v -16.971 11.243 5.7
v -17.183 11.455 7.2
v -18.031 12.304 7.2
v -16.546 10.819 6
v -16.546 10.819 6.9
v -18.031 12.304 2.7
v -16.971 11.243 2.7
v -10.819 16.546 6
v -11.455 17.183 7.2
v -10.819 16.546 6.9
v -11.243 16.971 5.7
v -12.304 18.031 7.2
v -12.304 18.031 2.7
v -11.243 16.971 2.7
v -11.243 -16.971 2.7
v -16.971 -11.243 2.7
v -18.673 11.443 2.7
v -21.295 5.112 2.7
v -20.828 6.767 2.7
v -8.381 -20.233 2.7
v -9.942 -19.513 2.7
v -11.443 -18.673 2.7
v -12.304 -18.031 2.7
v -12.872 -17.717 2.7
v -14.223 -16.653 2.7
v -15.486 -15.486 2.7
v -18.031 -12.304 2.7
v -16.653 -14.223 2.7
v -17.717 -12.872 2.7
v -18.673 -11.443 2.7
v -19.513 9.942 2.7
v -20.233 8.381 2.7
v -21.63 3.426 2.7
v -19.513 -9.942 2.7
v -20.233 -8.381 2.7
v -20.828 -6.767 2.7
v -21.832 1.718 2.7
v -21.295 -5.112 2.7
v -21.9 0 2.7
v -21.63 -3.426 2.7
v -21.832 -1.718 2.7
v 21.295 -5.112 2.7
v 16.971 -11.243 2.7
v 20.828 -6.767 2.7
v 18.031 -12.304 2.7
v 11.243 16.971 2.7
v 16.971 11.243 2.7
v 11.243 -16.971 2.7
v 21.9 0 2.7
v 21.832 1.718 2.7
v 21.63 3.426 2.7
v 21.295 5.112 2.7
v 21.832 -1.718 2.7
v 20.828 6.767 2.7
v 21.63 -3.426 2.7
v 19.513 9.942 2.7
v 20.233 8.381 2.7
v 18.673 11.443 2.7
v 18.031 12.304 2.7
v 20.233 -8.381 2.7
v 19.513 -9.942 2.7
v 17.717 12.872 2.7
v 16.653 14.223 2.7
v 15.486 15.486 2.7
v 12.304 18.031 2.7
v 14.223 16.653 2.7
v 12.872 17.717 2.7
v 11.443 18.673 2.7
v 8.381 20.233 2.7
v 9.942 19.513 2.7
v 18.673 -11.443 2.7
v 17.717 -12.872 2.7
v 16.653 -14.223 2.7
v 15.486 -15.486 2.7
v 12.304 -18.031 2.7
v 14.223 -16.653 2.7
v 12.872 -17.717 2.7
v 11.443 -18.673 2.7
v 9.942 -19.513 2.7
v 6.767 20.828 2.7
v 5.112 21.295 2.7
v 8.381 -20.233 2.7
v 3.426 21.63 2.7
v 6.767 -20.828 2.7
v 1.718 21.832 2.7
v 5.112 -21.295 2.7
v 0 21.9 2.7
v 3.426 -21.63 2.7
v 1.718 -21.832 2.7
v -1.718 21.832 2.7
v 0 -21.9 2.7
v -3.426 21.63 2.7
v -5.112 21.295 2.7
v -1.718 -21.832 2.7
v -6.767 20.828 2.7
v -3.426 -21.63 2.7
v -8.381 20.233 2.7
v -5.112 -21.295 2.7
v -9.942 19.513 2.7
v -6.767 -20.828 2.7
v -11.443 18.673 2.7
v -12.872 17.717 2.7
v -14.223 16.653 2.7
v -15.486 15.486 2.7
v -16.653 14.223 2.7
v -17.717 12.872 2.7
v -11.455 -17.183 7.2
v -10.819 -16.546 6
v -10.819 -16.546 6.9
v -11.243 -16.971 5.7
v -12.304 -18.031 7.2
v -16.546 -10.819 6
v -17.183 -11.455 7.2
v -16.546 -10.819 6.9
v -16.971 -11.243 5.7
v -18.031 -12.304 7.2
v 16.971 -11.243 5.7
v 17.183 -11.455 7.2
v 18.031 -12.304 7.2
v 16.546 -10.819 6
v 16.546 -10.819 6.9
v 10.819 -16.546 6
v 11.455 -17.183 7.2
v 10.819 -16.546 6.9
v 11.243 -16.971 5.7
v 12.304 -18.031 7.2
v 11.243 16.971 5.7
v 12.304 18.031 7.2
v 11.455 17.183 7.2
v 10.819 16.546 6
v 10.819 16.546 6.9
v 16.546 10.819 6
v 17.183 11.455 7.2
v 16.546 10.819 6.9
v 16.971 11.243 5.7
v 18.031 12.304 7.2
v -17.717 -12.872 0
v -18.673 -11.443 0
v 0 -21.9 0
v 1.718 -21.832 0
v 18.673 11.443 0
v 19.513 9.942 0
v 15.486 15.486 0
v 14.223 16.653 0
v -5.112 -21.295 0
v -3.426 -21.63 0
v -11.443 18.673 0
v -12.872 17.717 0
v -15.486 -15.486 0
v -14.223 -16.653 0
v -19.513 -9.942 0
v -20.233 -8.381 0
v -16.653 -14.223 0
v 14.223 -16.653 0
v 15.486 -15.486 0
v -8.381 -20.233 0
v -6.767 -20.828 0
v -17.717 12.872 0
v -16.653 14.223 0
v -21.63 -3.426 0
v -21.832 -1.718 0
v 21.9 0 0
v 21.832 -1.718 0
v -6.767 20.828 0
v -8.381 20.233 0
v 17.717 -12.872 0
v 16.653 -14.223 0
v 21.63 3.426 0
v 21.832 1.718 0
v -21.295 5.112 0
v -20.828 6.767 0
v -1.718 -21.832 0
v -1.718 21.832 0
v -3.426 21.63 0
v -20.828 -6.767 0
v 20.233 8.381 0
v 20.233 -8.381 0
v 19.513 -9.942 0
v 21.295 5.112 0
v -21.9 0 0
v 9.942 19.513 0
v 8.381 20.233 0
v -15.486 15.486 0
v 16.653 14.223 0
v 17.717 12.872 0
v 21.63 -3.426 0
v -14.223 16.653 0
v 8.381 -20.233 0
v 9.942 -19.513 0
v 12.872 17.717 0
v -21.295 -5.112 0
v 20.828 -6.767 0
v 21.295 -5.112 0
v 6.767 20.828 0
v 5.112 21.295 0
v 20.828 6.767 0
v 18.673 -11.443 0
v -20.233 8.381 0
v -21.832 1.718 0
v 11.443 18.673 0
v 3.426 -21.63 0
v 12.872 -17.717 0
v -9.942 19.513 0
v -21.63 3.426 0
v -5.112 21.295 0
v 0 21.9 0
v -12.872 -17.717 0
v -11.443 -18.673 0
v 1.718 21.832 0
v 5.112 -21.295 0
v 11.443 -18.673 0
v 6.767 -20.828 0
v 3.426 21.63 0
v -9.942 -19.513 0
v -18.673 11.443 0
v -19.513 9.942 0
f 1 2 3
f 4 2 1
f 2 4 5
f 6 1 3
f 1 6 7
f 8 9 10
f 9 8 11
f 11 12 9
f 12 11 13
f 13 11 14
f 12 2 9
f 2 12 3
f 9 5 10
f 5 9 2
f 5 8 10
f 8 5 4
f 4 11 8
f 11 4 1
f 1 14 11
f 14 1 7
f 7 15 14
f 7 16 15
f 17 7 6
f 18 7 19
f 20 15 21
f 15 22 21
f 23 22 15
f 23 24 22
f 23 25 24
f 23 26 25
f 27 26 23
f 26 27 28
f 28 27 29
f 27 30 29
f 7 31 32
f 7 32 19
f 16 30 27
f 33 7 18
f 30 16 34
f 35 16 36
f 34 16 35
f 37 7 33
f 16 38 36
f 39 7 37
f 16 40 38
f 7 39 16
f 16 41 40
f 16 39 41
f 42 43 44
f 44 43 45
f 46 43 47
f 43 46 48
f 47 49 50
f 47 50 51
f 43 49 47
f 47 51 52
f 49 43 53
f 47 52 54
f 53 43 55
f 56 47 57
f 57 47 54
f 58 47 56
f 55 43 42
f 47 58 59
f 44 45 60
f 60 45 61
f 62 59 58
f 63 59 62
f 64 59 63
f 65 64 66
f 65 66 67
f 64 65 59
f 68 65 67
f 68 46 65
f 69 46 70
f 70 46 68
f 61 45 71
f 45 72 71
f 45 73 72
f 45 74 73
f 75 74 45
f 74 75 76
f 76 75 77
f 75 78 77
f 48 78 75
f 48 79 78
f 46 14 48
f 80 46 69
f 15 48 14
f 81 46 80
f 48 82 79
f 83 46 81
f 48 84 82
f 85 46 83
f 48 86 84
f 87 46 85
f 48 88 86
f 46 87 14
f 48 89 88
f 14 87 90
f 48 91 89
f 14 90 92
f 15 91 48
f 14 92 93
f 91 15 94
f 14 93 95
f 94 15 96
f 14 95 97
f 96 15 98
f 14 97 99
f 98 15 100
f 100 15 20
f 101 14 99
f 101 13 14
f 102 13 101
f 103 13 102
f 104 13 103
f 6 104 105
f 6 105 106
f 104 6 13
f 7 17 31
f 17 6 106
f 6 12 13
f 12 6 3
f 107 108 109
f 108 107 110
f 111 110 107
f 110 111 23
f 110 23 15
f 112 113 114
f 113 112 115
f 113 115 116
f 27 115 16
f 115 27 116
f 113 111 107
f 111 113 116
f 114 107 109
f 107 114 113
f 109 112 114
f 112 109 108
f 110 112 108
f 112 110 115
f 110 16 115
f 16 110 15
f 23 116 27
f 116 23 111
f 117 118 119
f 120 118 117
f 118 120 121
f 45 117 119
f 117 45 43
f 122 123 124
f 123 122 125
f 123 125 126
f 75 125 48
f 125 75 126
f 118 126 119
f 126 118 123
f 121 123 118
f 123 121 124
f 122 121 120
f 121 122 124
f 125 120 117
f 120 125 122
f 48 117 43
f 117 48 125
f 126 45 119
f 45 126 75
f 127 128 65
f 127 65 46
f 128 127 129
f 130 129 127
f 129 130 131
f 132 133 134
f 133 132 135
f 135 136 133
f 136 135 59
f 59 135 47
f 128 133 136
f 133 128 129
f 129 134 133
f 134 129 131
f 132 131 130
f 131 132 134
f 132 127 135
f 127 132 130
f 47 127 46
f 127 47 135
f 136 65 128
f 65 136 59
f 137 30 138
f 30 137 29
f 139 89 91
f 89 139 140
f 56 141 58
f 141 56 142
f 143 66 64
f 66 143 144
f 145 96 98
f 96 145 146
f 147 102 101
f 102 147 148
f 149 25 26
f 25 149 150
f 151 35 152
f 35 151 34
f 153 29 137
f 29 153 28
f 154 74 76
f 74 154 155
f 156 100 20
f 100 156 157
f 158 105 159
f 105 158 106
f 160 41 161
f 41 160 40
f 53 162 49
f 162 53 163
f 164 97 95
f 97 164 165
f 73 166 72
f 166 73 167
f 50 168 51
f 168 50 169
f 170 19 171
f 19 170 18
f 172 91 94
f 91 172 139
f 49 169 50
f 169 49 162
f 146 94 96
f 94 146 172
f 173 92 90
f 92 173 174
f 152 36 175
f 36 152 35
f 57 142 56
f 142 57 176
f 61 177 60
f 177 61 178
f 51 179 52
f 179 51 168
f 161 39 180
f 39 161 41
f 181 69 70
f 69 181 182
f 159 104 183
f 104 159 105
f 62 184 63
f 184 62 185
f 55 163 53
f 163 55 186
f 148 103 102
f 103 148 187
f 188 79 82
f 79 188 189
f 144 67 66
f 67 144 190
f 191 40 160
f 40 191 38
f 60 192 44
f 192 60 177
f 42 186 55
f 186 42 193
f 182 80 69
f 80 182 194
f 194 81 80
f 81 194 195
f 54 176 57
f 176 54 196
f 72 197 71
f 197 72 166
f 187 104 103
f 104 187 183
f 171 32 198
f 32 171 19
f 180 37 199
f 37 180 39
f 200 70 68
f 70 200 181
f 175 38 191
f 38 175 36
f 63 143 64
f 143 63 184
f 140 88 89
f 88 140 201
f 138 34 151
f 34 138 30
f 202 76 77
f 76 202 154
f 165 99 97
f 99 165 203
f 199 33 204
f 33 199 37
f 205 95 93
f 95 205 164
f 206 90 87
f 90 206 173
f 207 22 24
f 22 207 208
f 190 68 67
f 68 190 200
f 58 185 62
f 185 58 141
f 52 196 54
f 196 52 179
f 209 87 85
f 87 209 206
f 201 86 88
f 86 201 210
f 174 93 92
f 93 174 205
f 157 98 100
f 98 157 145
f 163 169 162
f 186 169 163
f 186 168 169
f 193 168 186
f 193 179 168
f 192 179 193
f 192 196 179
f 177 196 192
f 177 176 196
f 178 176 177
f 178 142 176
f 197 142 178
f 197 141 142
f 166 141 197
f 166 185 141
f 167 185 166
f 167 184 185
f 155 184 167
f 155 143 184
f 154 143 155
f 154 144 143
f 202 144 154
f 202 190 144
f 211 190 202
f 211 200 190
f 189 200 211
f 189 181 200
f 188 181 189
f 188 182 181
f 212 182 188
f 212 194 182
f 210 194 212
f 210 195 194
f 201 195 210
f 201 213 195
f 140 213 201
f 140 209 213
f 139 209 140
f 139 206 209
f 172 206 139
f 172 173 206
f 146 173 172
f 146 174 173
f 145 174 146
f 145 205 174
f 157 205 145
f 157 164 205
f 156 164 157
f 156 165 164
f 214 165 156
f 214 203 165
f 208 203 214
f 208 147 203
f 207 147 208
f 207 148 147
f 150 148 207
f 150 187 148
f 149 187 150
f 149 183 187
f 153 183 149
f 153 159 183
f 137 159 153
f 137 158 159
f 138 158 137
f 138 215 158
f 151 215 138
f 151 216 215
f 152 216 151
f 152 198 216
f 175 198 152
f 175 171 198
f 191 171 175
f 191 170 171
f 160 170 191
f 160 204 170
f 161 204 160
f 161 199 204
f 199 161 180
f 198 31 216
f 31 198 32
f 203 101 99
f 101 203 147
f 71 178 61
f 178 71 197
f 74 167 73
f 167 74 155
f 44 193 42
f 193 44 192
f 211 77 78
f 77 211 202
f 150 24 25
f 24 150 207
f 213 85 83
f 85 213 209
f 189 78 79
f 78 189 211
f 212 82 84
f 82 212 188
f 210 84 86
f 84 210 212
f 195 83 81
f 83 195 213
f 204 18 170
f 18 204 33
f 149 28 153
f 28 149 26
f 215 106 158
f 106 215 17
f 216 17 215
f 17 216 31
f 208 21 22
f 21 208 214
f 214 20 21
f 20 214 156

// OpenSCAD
center_style="hole"; // [kanji,hole,blank]
points=4;
color="blue";
nub_roundness=.9;
nub_round_y=2.1;
nub_chamfer=false;
nub_type=1;
multi_star(points);
translate([0,0,4]) mirror([0,0,1]) !badge();
module badge() {
  scale(1.5) {
  cylinder(d=29.2,h=1.8,$fn=80);
  for(r=[45:90:360]) rotate([0,0,r])
    translate([-2.7,13.2,1.8]) rotate([90,0]) rotate([0,90]) linear_extrude(5.4,convexity=3) {
      //square([1.6,4]);
      translate([.1,0]) polygon([[0,2],[-.4,2.2],[-.4,2.8],[.2,3],[1,3],[1,2.6],[1,0],[0,0]]);
  }
}
}
module multi_star(points=6)
{
  scale(1.5)
  color(color) intersection() {
  translate([0,0,2]) scale([1,1,.6]) sphere(d=50,$fn=100);
  union() {
    if(center_style!="hole") cylinder(d=32,h=1,$fn=80);
    else intersection(){
      cylinder(d=32,h=2,$fn=80);
        for(r=[45:90:360]) rotate([0,0,r]) translate([-4,12]) difference(){
        cube([8,6,2]);
          translate([1.2,1.2,-.01]) cube([5.6,5.6,2.02]);
      }
    }
    if(center_style=="kanji") linear_extrude(2,convexity=3) {
      scale(0.75) kanji(color);
      rotate([0,0,90-(180/points)]) difference() {
        circle(d=33,$fn=points);
        circle(d=30,$fn=points);
      }
    }
    translate([0,0,3]) intersection() {
      for(r=[0:points-1]) rotate([0,0,r*(360/points)])
      {
        linear_extrude(0.6) translate([18,10]) rotate([0,0,-120]) squiggle();
        *for(m=[0:1]) mirror([m,0])
        translate([-8,14]) rotate([0,0,30]) cube([20,1,0.6]); // slash accents
      }
      linear_extrude(2.2,convexity=3) offset(r=-1.4) multi_profile(points, 1);
    }
    difference() {
      linear_extrude(4,convexity=3) multi_profile(points);
      translate([0,0,3]) linear_extrude(2.2,convexity=3) offset(r=-1.4) multi_profile(points, 1);
    }
  }
}
}
module multi_profile(points=5,extra=0) {
  difference() {
  circle(d=33,$fn=100);
  //if(center_style=="hole")
    circle(d=30,$fn=60);
  }
  difference() {
    for(r=[0:points-1]) rotate([0,0,r*(360/points)])
      nub();
    circle(d=30,$fn=60);
  }
}
module nub(type=nub_type)
{
  if(type==1)
  {
    intersection() {
        
        scale([2+points*-.15,1]) polygon([[-8,10],[-2,26],[2,26],[8,10]]);
        scale([nub_roundness,nub_round_y]) circle(d=26,$fn=40);
        circle(d=50,$fn=100);
      }
  }
  if(type==2)
    polygon([[-6,10],[-10,20],[0,25],[10,20],[6,10]]);
  if(type==3)
    intersection() {
        
        scale([nub_roundness,nub_round_y]) circle(d=26,$fn=40);
        circle(d=50,$fn=100);
      }
}
module gold_star()
{
  intersection() {
  translate([0,0,2]) scale([1,1,.6]) sphere(d=50,$fn=100);
  union() {
    difference() {
      linear_extrude(4,convexity=3) gold_profile();
      translate([0,0,3]) linear_extrude(2.2,convexity=3) offset(-1.4) gold_profile(1);
    }
  }
}
}
module gold_profile(extra=0) {
  difference() {
  circle(d=33,$fn=100);
  circle(d=30,$fn=60);
  }
  difference() {
    for(r=[0:5]) rotate([0,0,r*(360/6)])
      translate([0,15]) {
        difference() {
          intersection() {
            translate([-8,-1]) square([16,12]);
            translate([10,-10]) circle(d=40,$fn=80);
          }
          translate([12,3]) circle(d=12,$fn=40);
        }
        if(extra)
        {
          polygon([[0,0],[2,-4],[10,-30],[10,0]]);
        }
      }
    circle(d=30,$fn=60);
  }
}
module red_star() {
scale(1.5) intersection() {
  #translate([0,0,2]) scale([1,1,.6]) sphere(d=50,$fn=100);
  union() {
    difference() {
      linear_extrude(4,convexity=3) red_profile();
      translate([0,0,3]) linear_extrude(2.2,convexity=3) offset(-1.4) red_profile(1);
    }
    translate([0,0,3]) linear_extrude(1) for(r=[0:3]) rotate([0,0,r*90]) translate([19,-5]) rotate([0,0,205]) squiggle();
  }
}
}
module red_profile(extra=0) {
  difference() {
  circle(d=50,$fn=100);
  circle(d=30,$fn=50);
  difference() {
    for(r=[0:3]) rotate([0,0,r*90])
      translate([17,0]) {
        polygon([[0,0],[6,0],[10,-5],[20,10],[8,8],[6,5],[-4,10]]);
        if(extra)
        {
          polygon([[0,0],[2,-4],[10,-30],[10,0]]);
        }
      }
    circle(d=34,$fn=50);
  }
}
}

module squiggle() {
line();
translate([6,0]) rotate([0,0,90]) line();
translate([6,0]) rotate([0,0,90]) translate([6,0]) rotate([0,0,-90]) line();
translate([6,0]) rotate([0,0,90]) translate([6,0]) rotate([0,0,-90]) translate([6,0]) rotate([0,0,90]) line();
translate([6,0]) rotate([0,0,90]) translate([6,0]) rotate([0,0,-90]) translate([6,0]) rotate([0,0,90]) translate([6,0]) rotate([0,0,-90]) line();
}
module line(x=6,y=0,t=1) {
  hull() {
    circle(d=t,$fn=8);
    translate([x,y]) circle(d=t,$fn=8);
  }
}

module kanji(char="red") {
  if(char=="red") kanji_red();
  else if(char=="blue") kanji_blue();
  else if(char=="gold") kanji_gold();
  else if(char=="super") kanji_super();
  else if(char=="pink") kanji_pink();
  else if(char=="white") kanji_white();
  else if(char=="yellow") kanji_yellow();
}
module kanji_blue() {
  scale(2) translate([26.93,0]) scale([25.4/90, -25.4/90])
  union()
  {
      polygon([[-80.118500,-5.165000],[-79.452500,-4.818500],[-79.218500,-4.013000],[-79.452500,-3.207500],[-80.118500,-2.861000],[-110.751500,-2.861000],[-111.404000,-3.207500],[-111.651500,-4.013000],[-111.404000,-4.818500],[-110.751500,-5.165000],[-96.929500,-5.165000],[-96.929500,-7.325000],[-107.511500,-7.325000],[-108.177500,-7.653500],[-108.411500,-8.441000],[-108.177500,-9.228500],[-107.511500,-9.557000],[-96.928500,-9.557000],[-96.928500,-11.536000],[-109.275500,-11.536000],[-109.941500,-11.887000],[-110.175500,-12.724000],[-109.941500,-13.525000],[-109.275500,-13.840000],[-96.928500,-13.840000],[-96.928500,-15.784000],[-96.591000,-16.576000],[-95.632500,-16.828000],[-94.674000,-16.576000],[-94.336500,-15.784000],[-94.336500,-13.840000],[-81.666500,-13.840000],[-81.000500,-13.529500],[-80.766500,-12.760000],[-81.000500,-11.891500],[-81.666500,-11.536000],[-94.336500,-11.536000],[-94.336500,-9.557000],[-83.357500,-9.557000],[-82.691500,-9.228500],[-82.457500,-8.441000],[-82.691500,-7.653500],[-83.357500,-7.325000],[-94.337500,-7.325000],[-94.337500,-5.165000],[-80.118500,-5.165000]]);
    difference()
    {
         polygon([[-104.164500,15.641000],[-104.501875,16.419000],[-105.459500,16.684000],[-106.503500,16.414000],[-106.899500,15.604000],[-106.899500,1.890000],[-106.721750,0.725625],[-106.179500,-0.081000],[-105.259250,-0.550125],[-103.947500,-0.702000],[-86.993500,-0.702000],[-85.666562,-0.550125],[-84.748000,-0.081000],[-84.214188,0.725625],[-84.041500,1.890000],[-84.041500,13.193000],[-84.273797,14.599094],[-85.008875,15.586500],[-86.304016,16.168906],[-88.216500,16.360000],[-92.464500,15.928000],[-93.067500,15.550000],[-93.292500,14.848000],[-93.256500,14.524000],[-92.842500,13.790500],[-92.104500,13.516000],[-91.852500,13.552000],[-88.828500,13.948000],[-87.172875,13.696000],[-86.813766,13.310125],[-86.704500,12.688000],[-86.704500,10.492000],[-104.164500,10.492000],[-104.164500,15.641000]]);
       //translate([0, 0, -fudge])
         //linear_extrude(height=h+2*fudge)
           polygon([[-86.706500,2.394000],[-86.958500,1.705500],[-87.750500,1.530000],[-103.120500,1.530000],[-103.912500,1.705500],[-104.164500,2.394000],[-104.164500,3.834000],[-86.706500,3.834000],[-86.706500,2.394000]]);
       //translate([0, 0, -fudge])
         //linear_extrude(height=h+2*fudge)
           polygon([[-104.164500,8.333000],[-86.706500,8.333000],[-86.706500,5.993000],[-104.164500,5.993000],[-104.164500,8.333000]]);
    }
  }
}
module kanji_red() {
  scale(2) translate([40.45,0.5]) scale([25.4/90, -25.4/90]) union()
  {
//    linear_extrude(height=h)
      polygon([[-152.115500,0.558000],[-152.187500,1.026000],[-153.139797,3.606734],[-154.351875,6.015625],[-155.786516,8.188453],[-157.406500,10.061000],[-158.342500,10.457000],[-159.422500,10.025000],[-159.818500,9.125000],[-159.422500,8.117000],[-156.740625,4.540000],[-154.815500,0.234000],[-154.334000,-0.432000],[-153.555500,-0.666000],[-153.123500,-0.594000],[-152.376500,-0.166500],[-152.115500,0.558000]]);
//    linear_extrude(height=h)
      polygon([[-158.379500,-2.465000],[-159.126500,-2.811500],[-159.387500,-3.725000],[-159.126500,-4.652000],[-158.379500,-4.985000],[-144.953500,-4.985000],[-144.953500,-9.880000],[-155.679500,-9.880000],[-156.426500,-10.213000],[-156.687500,-11.140000],[-156.426500,-12.053500],[-155.679500,-12.400000],[-144.952500,-12.400000],[-144.952500,-15.712000],[-144.592500,-16.495000],[-143.584500,-16.792000],[-142.576500,-16.495000],[-142.216500,-15.712000],[-142.216500,-12.400000],[-130.841500,-12.400000],[-130.094500,-12.053500],[-129.833500,-11.140000],[-130.094500,-10.226500],[-130.841500,-9.880000],[-142.216500,-9.880000],[-142.216500,-4.984000],[-127.890500,-4.984000],[-127.125500,-4.637500],[-126.846500,-3.724000],[-127.125500,-2.810500],[-127.890500,-2.464000],[-137.933500,-2.464000],[-137.933500,12.906000],[-138.167484,14.421781],[-138.914375,15.475000],[-140.241578,16.089469],[-142.216500,16.289000],[-145.852500,15.893000],[-146.586000,15.456500],[-146.860500,14.669000],[-146.824500,14.273000],[-146.401500,13.521500],[-145.600500,13.229000],[-145.168500,13.301000],[-142.648500,13.661000],[-141.051000,13.377500],[-140.750063,12.916813],[-140.668500,12.149000],[-140.668500,-2.465000],[-145.348500,-2.465000],[-145.965953,4.030578],[-146.665646,6.739451],[-147.669875,9.139125],[-149.011557,11.267158],[-150.723609,13.161109],[-152.838951,14.858537],[-155.390500,16.397000],[-156.290500,16.649000],[-156.938500,16.491500],[-157.478500,16.037000],[-157.730500,15.173000],[-157.564000,14.529500],[-157.046500,14.021000],[-154.708236,12.676178],[-152.796828,11.206984],[-151.273475,9.573330],[-150.099375,7.735125],[-149.235729,5.652279],[-148.643734,3.284703],[-148.119500,-2.465000],[-158.379500,-2.465000]]);
//    linear_extrude(height=h)
      polygon([[-133.290500,-0.485000],[-132.575000,-0.260000],[-132.102500,0.451000],[-129.960625,5.261000],[-127.171500,9.450000],[-126.847500,10.350000],[-127.005000,10.980000],[-127.459500,11.502000],[-128.359500,11.826000],[-128.980500,11.664000],[-129.547500,11.178000],[-132.458875,6.629000],[-134.694500,1.243000],[-134.766500,0.739000],[-134.510000,0.001000],[-133.794500,-0.413000],[-133.290500,-0.485000]]);
  }
}

module kanji_gold() {
  scale(2) translate([-26.76,0]) scale([25.4/90, -25.4/90]) union()
  {
    //linear_extrude(height=h)
      polygon([[84.078500,9.197000],[83.377000,8.873000],[83.107500,8.009000],[83.377000,7.163000],[84.078500,6.857000],[93.545500,6.857000],[93.545500,3.438000],[85.014500,3.438000],[83.143375,5.795625],[81.055500,7.830000],[80.084500,8.226000],[79.039500,7.722000],[78.715500,6.858000],[79.291500,5.778000],[82.374375,2.596625],[83.721609,0.639984],[84.727500,-1.313000],[85.209000,-1.974500],[85.879500,-2.177000],[86.455500,-2.069000],[87.133625,-1.668500],[87.353500,-1.025000],[87.173500,-0.341000],[86.489500,1.063000],[93.544500,1.063000],[93.544500,-1.312000],[93.909500,-1.978000],[94.841500,-2.212000],[95.821625,-1.978000],[96.208500,-1.312000],[96.208500,1.063000],[108.446500,1.063000],[109.162125,1.369000],[109.419500,2.215000],[109.162500,3.097000],[108.446500,3.439000],[96.208500,3.439000],[96.208500,6.858000],[107.224500,6.858000],[107.907750,7.164000],[108.160500,8.010000],[107.908125,8.860500],[107.224500,9.198000],[96.208500,9.198000],[96.208500,12.942000],[110.210500,12.942000],[110.976000,13.270500],[111.255500,14.166000],[110.976375,15.048000],[110.210500,15.390000],[79.436500,15.390000],[78.671000,15.061500],[78.391500,14.166000],[78.670625,13.270500],[79.436500,12.942000],[93.545500,12.942000],[93.545500,9.198000],[84.078500,9.198000]]);
    difference()
    {
       //linear_extrude(height=h)
         polygon([[104.633500,-15.532000],[105.998125,-15.367203],[106.964500,-14.861625],[107.539375,-13.998484],[107.729500,-12.761000],[107.729500,-5.382000],[107.539375,-4.170375],[106.964500,-3.330000],[105.998125,-2.840625],[104.633500,-2.682000],[85.123500,-2.682000],[83.758875,-2.840625],[82.792500,-3.330000],[82.217625,-4.170375],[82.027500,-5.382000],[82.027500,-12.760000],[82.217625,-13.997906],[82.792500,-14.861000],[83.758875,-15.366344],[85.123500,-15.531000],[104.633500,-15.531000]]);
       //translate([0, 0, -fudge])
         //linear_extrude(height=h+2*fudge)
           polygon([[104.993500,-10.240000],[104.993500,-12.256000],[104.759125,-12.975500],[103.985500,-13.155000],[85.770500,-13.155000],[84.996875,-12.975125],[84.762500,-12.256000],[84.762500,-10.240000],[104.993500,-10.240000]]);
       //translate([0, 0, -fudge])
         //linear_extrude(height=h+2*fudge)
           polygon([[84.762500,-5.813000],[84.996875,-5.156000],[85.770500,-4.985000],[103.985500,-4.985000],[104.759125,-5.156000],[104.993500,-5.813000],[104.993500,-7.973000],[84.763500,-7.973000],[84.763500,-5.813000]]);
    }
  }
}

module kanji_super() {
  scale(2) translate([-40.27,0]) scale([25.4/90, -25.4/90]) union()
  {
    //linear_extrude(height=h)
      polygon([[133.471500,-2.321000],[127.207500,-2.321000],[126.460500,-2.663000],[126.199500,-3.545000],[126.460125,-4.427000],[127.207500,-4.769000],[133.146500,-4.769000],[133.146500,-9.340000],[128.105500,-9.340000],[127.359250,-9.682000],[127.097500,-10.564000],[127.358875,-11.446000],[128.105500,-11.788000],[133.146500,-11.788000],[133.146500,-15.711000],[133.515125,-16.426500],[134.478500,-16.683000],[135.392000,-16.426500],[135.738500,-15.711000],[135.738500,-11.788000],[140.236500,-11.788000],[140.983500,-11.446000],[141.244500,-10.564000],[140.983875,-9.682000],[140.236500,-9.340000],[135.738500,-9.340000],[135.738500,-4.769000],[140.416500,-4.769000],[141.226875,-4.427000],[141.496500,-3.545000],[141.235875,-2.663000],[140.488500,-2.321000],[135.990500,-2.321000],[135.990500,2.610000],[140.381500,2.610000],[141.159500,2.934000],[141.424500,3.798000],[141.159500,4.666500],[140.381500,5.022000],[135.990500,5.022000],[135.990500,11.681000],[137.669953,12.425750],[139.764625,12.941000],[145.996500,13.337000],[158.486500,12.941000],[158.593500,12.941000],[159.489875,13.265000],[159.818500,14.237000],[159.818500,14.345000],[159.503375,15.357500],[158.593500,15.749000],[146.068500,15.965000],[142.044813,15.824375],[138.986000,15.407000],[136.642688,14.719625],[134.765500,13.769000],[132.250500,11.555375],[130.302500,8.477000],[129.397500,12.103875],[128.249500,15.136000],[127.696500,15.784000],[126.954500,16.000000],[126.270500,15.856000],[125.751625,15.428500],[125.584500,14.812000],[125.801500,13.948000],[126.925938,11.189656],[127.753750,7.999500],[128.271438,4.471844],[128.465500,0.701000],[128.838500,-0.190000],[129.832500,-0.487000],[130.786125,-0.158500],[131.092500,0.737000],[130.768500,5.381000],[131.970500,7.612625],[133.469500,9.629000],[133.469500,-2.321000]]);
    //linear_extrude(height=h)
      polygon([[142.866500,-12.832000],[142.069250,-13.174000],[141.786500,-14.056000],[142.069625,-14.920000],[142.866500,-15.244000],[155.464500,-15.244000],[156.817719,-15.043188],[157.759000,-14.474500],[158.308781,-13.588562],[158.487500,-12.436000],[158.357000,-8.791875],[157.983500,-5.633000],[157.570219,-4.440078],[156.890500,-3.567875],[155.893531,-3.026234],[154.528500,-2.825000],[151.073500,-3.041000],[150.388500,-3.432500],[150.135500,-4.229000],[150.172500,-4.589000],[150.586375,-5.273000],[151.215500,-5.525000],[151.395500,-5.489000],[154.131500,-5.237000],[155.009125,-5.565500],[155.428500,-6.677000],[155.823500,-11.752000],[155.540375,-12.602500],[154.743500,-12.832000],[149.993500,-12.832000],[149.515375,-9.382906],[148.436500,-6.541500],[146.723125,-4.226594],[144.341500,-2.357000],[143.550500,-2.141000],[142.862000,-2.325500],[142.362500,-2.861000],[142.145500,-3.581000],[142.303250,-4.202000],[142.756500,-4.661000],[144.655781,-6.044031],[146.041500,-7.815000],[146.927719,-10.051719],[147.328500,-12.832000],[142.866500,-12.832000]]);
    difference()
    {
       //linear_extrude(height=h)
         polygon([[158.127500,8.153000],[157.949766,9.415812],[157.407625,10.263500],[156.487672,10.739937],[155.176500,10.889000],[145.600500,10.889000],[144.268672,10.739937],[143.338375,10.263500],[142.792641,9.415812],[142.614500,8.153000],[142.614500,1.746000],[142.792781,0.483609],[143.338750,-0.364125],[144.269094,-0.840797],[145.600500,-0.990000],[155.176500,-0.990000],[156.488094,-0.840938],[157.408000,-0.364500],[157.949906,0.483187],[158.127500,1.746000],[158.127500,8.153000]]);
       //translate([0, 0, -fudge])
         //linear_extrude(height=h+2*fudge)
           polygon([[154.455500,8.513000],[155.216000,8.328500],[155.463500,7.577000],[155.463500,2.285000],[155.216000,1.533500],[154.455500,1.349000],[146.320500,1.349000],[145.527625,1.533500],[145.275500,2.285000],[145.275500,7.577000],[145.527625,8.328500],[146.320500,8.513000],[154.455500,8.513000]]);
    }
  }
}

module kanji_pink() {
  scale(2) translate([-13.21,0]) scale([25.4/90, -25.4/90]) union()
  {
    //linear_extrude(height=h)
      polygon([[40.231500,-9.844000],[40.961000,-9.515500],[41.204500,-8.620000],[40.961375,-7.751500],[40.231500,-7.396000],[38.001500,-7.396000],[39.746125,-4.030875],[41.923500,-1.205000],[42.247500,-0.341000],[41.923500,0.523000],[41.095500,0.883000],[40.159500,0.415000],[38.562750,-2.055500],[37.315500,-4.877000],[37.928500,1.278000],[37.928500,15.784000],[37.537000,16.580500],[36.524500,16.864000],[35.597125,16.580500],[35.264500,15.784000],[35.264500,3.654000],[35.803500,-3.617000],[34.174750,1.953500],[32.061500,6.390000],[31.557000,6.939000],[30.944500,7.110000],[30.116500,6.822000],[29.684500,5.886000],[30.008500,4.878000],[31.588703,2.205734],[32.987125,-0.867875],[34.129234,-4.137047],[34.940500,-7.396000],[31.557500,-7.396000],[30.810500,-7.738000],[30.549500,-8.620000],[30.810125,-9.515500],[31.557500,-9.844000],[35.264500,-9.844000],[35.264500,-15.820000],[35.615375,-16.585000],[36.559500,-16.864000],[37.554500,-16.585000],[37.928500,-15.820000],[37.928500,-9.844000],[40.231500,-9.844000]]);
    //linear_extrude(height=h)
      polygon([[50.129500,-2.933000],[49.616797,4.093578],[48.975830,6.977670],[48.078375,9.490125],[46.924373,11.666814],[45.513766,13.543609],[43.846494,15.156381],[41.922500,16.541000],[41.094500,16.829000],[40.447250,16.671500],[39.906500,16.217000],[39.654500,15.425000],[39.834500,14.745500],[40.338500,14.201000],[43.001812,12.188969],[44.983000,9.741750],[46.343187,6.653656],[47.143500,2.719000],[44.762250,4.635125],[42.139500,6.282000],[41.383500,6.498000],[40.776000,6.304500],[40.303500,5.706000],[40.158500,5.094000],[40.352125,4.419000],[40.951500,3.906000],[44.253625,1.962500],[47.394500,-0.413000],[47.466500,-3.257000],[47.466500,-15.568000],[47.848000,-16.315000],[48.796500,-16.576000],[49.773000,-16.315000],[50.128500,-15.568000],[50.128500,-2.933000]]);
    //linear_extrude(height=h)
      polygon([[42.608500,-12.256000],[43.242000,-12.076000],[43.686500,-11.572000],[45.144625,-8.611500],[46.387500,-5.381000],[46.567500,-4.553000],[46.382875,-3.950000],[45.846500,-3.509000],[45.162500,-3.329000],[44.528000,-3.545000],[44.082500,-4.193000],[41.490500,-10.384000],[41.310500,-11.032000],[41.495125,-11.666500],[42.031500,-12.112000],[42.608500,-12.256000]]);
    //linear_extrude(height=h)
      polygon([[55.889500,12.221000],[55.981203,12.970250],[56.326125,13.355000],[58.194500,13.517000],[60.196625,13.179500],[60.740797,12.742438],[61.038500,12.113000],[61.470500,9.017000],[61.821125,8.144000],[62.658500,7.865000],[62.838500,7.865000],[63.692625,8.225000],[63.953500,9.017000],[63.234500,13.517000],[62.644312,14.666187],[61.645750,15.474500],[60.100812,15.952062],[57.871500,16.109000],[55.672531,15.961062],[54.239500,15.465500],[53.461219,14.544687],[53.226500,13.121000],[53.226500,-15.568000],[53.573000,-16.315000],[54.486500,-16.576000],[55.485875,-16.315000],[55.890500,-15.568000],[55.890500,-1.314000],[59.647875,1.246375],[62.945500,3.941000],[63.486500,5.021000],[63.162500,5.920000],[62.154500,6.460000],[61.218500,6.064000],[58.702250,3.774000],[55.890500,1.673000],[55.890500,12.221000]]);
    //linear_extrude(height=h)
      polygon([[62.909500,-11.212000],[62.837500,-10.744000],[61.191250,-7.261500],[59.165500,-3.941000],[58.050500,-3.329000],[57.294500,-3.581000],[56.858000,-3.981500],[56.718500,-4.517000],[57.042500,-5.453000],[58.905500,-8.535000],[60.390500,-11.752000],[60.830625,-12.319000],[61.433500,-12.508000],[62.046500,-12.364000],[62.693250,-11.896000],[62.909500,-11.212000]]);
  }
}

module kanji_white() {
  scale(2) translate([0.08,-0.21]) scale([25.4/90, -25.4/90]) union()
  {
    difference()
    {
       //linear_extrude(height=h)
         polygon([[9.702500,-11.572000],[11.235000,-11.371766],[12.325000,-10.753125],[12.976250,-9.689172],[13.192500,-8.153000],[13.192500,11.969000],[12.976250,13.505594],[12.325000,14.569500],[11.235000,15.187906],[9.702500,15.388000],[-10.275500,15.388000],[-11.823500,15.187906],[-12.912500,14.569500],[-13.556000,13.505594],[-13.767500,11.969000],[-13.767500,-8.153000],[-13.550938,-9.689172],[-12.899000,-10.753125],[-11.808312,-11.371766],[-10.275500,-11.572000],[-4.301500,-11.572000],[-2.283500,-16.072000],[-1.771125,-16.670500],[-0.881500,-16.864000],[-0.377500,-16.828000],[0.513875,-16.441000],[0.810500,-15.784000],[0.775500,-15.532000],[-1.132500,-11.573000],[9.702500,-11.573000]]);
       //translate([0, 0, -fudge])
         //linear_extrude(height=h+2*fudge)
           polygon([[10.313500,-7.541000],[9.958000,-8.621000],[8.657500,-8.945000],[-9.231500,-8.945000],[-10.518875,-8.621000],[-10.887500,-7.541000],[-10.887500,0.162000],[10.314500,0.162000],[10.314500,-7.541000]]);
       //translate([0, 0, -fudge])
         //linear_extrude(height=h+2*fudge)
           polygon([[-10.888500,2.826000],[-10.888500,11.321000],[-10.519500,12.401000],[-9.232500,12.725000],[8.656500,12.725000],[9.957000,12.401000],[10.312500,11.321000],[10.312500,2.826000],[-10.888500,2.826000]]);
    }
  }
}

module kanji_yellow() {

  scale(2) translate([13.41,-.03]) scale([25.4/90, -25.4/90]) union()
  {
    difference()
    {
       //linear_extrude(height=h)
         polygon([[-63.159500,-5.525000],[-63.875000,-5.831000],[-64.131500,-6.677000],[-63.875000,-7.523000],[-63.159500,-7.829000],[-54.520500,-7.829000],[-54.520500,-11.320000],[-61.215500,-11.320000],[-61.899500,-11.639500],[-62.151500,-12.472000],[-61.899500,-13.318000],[-61.215500,-13.624000],[-54.520500,-13.624000],[-54.520500,-15.855000],[-54.156125,-16.570500],[-53.225500,-16.827000],[-52.267000,-16.570500],[-51.929500,-15.855000],[-51.929500,-13.624000],[-43.506500,-13.624000],[-43.506500,-15.855000],[-43.142000,-16.602000],[-42.210500,-16.863000],[-41.252000,-16.602000],[-40.914500,-15.855000],[-40.914500,-13.624000],[-33.751500,-13.624000],[-33.036000,-13.318000],[-32.779500,-12.472000],[-33.036000,-11.639500],[-33.751500,-11.320000],[-40.914500,-11.320000],[-40.914500,-7.828000],[-31.915500,-7.828000],[-31.168500,-7.522000],[-30.907500,-6.676000],[-31.168500,-5.830000],[-31.915500,-5.524000],[-46.421500,-5.524000],[-46.421500,-2.968000],[-37.962500,-2.968000],[-36.520250,-2.800375],[-35.523500,-2.275000],[-34.945250,-1.358125],[-34.758500,-0.016000],[-34.758500,7.363000],[-34.945250,8.699500],[-35.523500,9.604000],[-36.520250,10.117000],[-37.962500,10.279000],[-57.148500,10.279000],[-58.590750,10.117000],[-59.587500,9.604000],[-60.165750,8.699500],[-60.352500,7.363000],[-60.352500,-0.016000],[-60.165750,-1.358125],[-59.587500,-2.275000],[-58.590750,-2.800375],[-57.148500,-2.968000],[-49.013500,-2.968000],[-49.013500,-5.524000],[-63.159500,-5.524000]]);
       //translate([0, 0, -fudge])
         //linear_extrude(height=h+2*fudge)
           polygon([[-56.644500,-0.773000],[-57.423000,-0.593000],[-57.688500,0.127000],[-57.688500,2.466000],[-49.013500,2.466000],[-49.013500,-0.773000],[-56.644500,-0.773000]]);
       //translate([0, 0, -fudge])
         //linear_extrude(height=h+2*fudge)
           polygon([[-57.688500,4.590000],[-57.688500,7.182000],[-57.423000,7.902000],[-56.644500,8.082000],[-49.013500,8.082000],[-49.013500,4.590000],[-57.688500,4.590000]]);
       //translate([0, 0, -fudge])
         //linear_extrude(height=h+2*fudge)
           polygon([[-43.505500,-11.320000],[-51.928500,-11.320000],[-51.928500,-7.828000],[-43.505500,-7.828000],[-43.505500,-11.320000]]);
       //translate([0, 0, -fudge])
         //linear_extrude(height=h+2*fudge)
           polygon([[-46.421500,2.466000],[-37.422500,2.466000],[-37.422500,0.127000],[-37.683500,-0.593000],[-38.430500,-0.773000],[-46.421500,-0.773000],[-46.421500,2.466000]]);
       //translate([0, 0, -fudge])
         //linear_extrude(height=h+2*fudge)
           polygon([[-46.421500,8.082000],[-38.430500,8.082000],[-37.683500,7.902000],[-37.422500,7.182000],[-37.422500,4.590000],[-46.421500,4.590000],[-46.421500,8.082000]]);
    }
    //linear_extrude(height=h)
      polygon([[-52.864500,11.213000],[-51.784500,11.753000],[-51.460500,12.509000],[-51.667500,13.067000],[-52.252500,13.517000],[-57.017500,15.461000],[-62.403500,16.649000],[-62.727500,16.685000],[-63.546500,16.397000],[-63.987500,15.569000],[-63.987500,15.317000],[-63.726500,14.520500],[-62.979500,14.129000],[-57.877375,13.049000],[-53.692500,11.429000],[-52.864500,11.213000]]);
    //linear_extrude(height=h)
      polygon([[-32.275500,14.057000],[-31.416000,14.502500],[-31.123500,15.353000],[-31.123500,15.569000],[-31.573500,16.410500],[-32.455500,16.685000],[-32.743500,16.649000],[-38.399000,15.524000],[-43.649500,13.481000],[-44.185000,13.013125],[-44.369500,12.438000],[-44.081500,11.682000],[-43.073500,11.178000],[-42.209500,11.394000],[-37.539500,13.062625],[-32.275500,14.057000]]);
  }
}
